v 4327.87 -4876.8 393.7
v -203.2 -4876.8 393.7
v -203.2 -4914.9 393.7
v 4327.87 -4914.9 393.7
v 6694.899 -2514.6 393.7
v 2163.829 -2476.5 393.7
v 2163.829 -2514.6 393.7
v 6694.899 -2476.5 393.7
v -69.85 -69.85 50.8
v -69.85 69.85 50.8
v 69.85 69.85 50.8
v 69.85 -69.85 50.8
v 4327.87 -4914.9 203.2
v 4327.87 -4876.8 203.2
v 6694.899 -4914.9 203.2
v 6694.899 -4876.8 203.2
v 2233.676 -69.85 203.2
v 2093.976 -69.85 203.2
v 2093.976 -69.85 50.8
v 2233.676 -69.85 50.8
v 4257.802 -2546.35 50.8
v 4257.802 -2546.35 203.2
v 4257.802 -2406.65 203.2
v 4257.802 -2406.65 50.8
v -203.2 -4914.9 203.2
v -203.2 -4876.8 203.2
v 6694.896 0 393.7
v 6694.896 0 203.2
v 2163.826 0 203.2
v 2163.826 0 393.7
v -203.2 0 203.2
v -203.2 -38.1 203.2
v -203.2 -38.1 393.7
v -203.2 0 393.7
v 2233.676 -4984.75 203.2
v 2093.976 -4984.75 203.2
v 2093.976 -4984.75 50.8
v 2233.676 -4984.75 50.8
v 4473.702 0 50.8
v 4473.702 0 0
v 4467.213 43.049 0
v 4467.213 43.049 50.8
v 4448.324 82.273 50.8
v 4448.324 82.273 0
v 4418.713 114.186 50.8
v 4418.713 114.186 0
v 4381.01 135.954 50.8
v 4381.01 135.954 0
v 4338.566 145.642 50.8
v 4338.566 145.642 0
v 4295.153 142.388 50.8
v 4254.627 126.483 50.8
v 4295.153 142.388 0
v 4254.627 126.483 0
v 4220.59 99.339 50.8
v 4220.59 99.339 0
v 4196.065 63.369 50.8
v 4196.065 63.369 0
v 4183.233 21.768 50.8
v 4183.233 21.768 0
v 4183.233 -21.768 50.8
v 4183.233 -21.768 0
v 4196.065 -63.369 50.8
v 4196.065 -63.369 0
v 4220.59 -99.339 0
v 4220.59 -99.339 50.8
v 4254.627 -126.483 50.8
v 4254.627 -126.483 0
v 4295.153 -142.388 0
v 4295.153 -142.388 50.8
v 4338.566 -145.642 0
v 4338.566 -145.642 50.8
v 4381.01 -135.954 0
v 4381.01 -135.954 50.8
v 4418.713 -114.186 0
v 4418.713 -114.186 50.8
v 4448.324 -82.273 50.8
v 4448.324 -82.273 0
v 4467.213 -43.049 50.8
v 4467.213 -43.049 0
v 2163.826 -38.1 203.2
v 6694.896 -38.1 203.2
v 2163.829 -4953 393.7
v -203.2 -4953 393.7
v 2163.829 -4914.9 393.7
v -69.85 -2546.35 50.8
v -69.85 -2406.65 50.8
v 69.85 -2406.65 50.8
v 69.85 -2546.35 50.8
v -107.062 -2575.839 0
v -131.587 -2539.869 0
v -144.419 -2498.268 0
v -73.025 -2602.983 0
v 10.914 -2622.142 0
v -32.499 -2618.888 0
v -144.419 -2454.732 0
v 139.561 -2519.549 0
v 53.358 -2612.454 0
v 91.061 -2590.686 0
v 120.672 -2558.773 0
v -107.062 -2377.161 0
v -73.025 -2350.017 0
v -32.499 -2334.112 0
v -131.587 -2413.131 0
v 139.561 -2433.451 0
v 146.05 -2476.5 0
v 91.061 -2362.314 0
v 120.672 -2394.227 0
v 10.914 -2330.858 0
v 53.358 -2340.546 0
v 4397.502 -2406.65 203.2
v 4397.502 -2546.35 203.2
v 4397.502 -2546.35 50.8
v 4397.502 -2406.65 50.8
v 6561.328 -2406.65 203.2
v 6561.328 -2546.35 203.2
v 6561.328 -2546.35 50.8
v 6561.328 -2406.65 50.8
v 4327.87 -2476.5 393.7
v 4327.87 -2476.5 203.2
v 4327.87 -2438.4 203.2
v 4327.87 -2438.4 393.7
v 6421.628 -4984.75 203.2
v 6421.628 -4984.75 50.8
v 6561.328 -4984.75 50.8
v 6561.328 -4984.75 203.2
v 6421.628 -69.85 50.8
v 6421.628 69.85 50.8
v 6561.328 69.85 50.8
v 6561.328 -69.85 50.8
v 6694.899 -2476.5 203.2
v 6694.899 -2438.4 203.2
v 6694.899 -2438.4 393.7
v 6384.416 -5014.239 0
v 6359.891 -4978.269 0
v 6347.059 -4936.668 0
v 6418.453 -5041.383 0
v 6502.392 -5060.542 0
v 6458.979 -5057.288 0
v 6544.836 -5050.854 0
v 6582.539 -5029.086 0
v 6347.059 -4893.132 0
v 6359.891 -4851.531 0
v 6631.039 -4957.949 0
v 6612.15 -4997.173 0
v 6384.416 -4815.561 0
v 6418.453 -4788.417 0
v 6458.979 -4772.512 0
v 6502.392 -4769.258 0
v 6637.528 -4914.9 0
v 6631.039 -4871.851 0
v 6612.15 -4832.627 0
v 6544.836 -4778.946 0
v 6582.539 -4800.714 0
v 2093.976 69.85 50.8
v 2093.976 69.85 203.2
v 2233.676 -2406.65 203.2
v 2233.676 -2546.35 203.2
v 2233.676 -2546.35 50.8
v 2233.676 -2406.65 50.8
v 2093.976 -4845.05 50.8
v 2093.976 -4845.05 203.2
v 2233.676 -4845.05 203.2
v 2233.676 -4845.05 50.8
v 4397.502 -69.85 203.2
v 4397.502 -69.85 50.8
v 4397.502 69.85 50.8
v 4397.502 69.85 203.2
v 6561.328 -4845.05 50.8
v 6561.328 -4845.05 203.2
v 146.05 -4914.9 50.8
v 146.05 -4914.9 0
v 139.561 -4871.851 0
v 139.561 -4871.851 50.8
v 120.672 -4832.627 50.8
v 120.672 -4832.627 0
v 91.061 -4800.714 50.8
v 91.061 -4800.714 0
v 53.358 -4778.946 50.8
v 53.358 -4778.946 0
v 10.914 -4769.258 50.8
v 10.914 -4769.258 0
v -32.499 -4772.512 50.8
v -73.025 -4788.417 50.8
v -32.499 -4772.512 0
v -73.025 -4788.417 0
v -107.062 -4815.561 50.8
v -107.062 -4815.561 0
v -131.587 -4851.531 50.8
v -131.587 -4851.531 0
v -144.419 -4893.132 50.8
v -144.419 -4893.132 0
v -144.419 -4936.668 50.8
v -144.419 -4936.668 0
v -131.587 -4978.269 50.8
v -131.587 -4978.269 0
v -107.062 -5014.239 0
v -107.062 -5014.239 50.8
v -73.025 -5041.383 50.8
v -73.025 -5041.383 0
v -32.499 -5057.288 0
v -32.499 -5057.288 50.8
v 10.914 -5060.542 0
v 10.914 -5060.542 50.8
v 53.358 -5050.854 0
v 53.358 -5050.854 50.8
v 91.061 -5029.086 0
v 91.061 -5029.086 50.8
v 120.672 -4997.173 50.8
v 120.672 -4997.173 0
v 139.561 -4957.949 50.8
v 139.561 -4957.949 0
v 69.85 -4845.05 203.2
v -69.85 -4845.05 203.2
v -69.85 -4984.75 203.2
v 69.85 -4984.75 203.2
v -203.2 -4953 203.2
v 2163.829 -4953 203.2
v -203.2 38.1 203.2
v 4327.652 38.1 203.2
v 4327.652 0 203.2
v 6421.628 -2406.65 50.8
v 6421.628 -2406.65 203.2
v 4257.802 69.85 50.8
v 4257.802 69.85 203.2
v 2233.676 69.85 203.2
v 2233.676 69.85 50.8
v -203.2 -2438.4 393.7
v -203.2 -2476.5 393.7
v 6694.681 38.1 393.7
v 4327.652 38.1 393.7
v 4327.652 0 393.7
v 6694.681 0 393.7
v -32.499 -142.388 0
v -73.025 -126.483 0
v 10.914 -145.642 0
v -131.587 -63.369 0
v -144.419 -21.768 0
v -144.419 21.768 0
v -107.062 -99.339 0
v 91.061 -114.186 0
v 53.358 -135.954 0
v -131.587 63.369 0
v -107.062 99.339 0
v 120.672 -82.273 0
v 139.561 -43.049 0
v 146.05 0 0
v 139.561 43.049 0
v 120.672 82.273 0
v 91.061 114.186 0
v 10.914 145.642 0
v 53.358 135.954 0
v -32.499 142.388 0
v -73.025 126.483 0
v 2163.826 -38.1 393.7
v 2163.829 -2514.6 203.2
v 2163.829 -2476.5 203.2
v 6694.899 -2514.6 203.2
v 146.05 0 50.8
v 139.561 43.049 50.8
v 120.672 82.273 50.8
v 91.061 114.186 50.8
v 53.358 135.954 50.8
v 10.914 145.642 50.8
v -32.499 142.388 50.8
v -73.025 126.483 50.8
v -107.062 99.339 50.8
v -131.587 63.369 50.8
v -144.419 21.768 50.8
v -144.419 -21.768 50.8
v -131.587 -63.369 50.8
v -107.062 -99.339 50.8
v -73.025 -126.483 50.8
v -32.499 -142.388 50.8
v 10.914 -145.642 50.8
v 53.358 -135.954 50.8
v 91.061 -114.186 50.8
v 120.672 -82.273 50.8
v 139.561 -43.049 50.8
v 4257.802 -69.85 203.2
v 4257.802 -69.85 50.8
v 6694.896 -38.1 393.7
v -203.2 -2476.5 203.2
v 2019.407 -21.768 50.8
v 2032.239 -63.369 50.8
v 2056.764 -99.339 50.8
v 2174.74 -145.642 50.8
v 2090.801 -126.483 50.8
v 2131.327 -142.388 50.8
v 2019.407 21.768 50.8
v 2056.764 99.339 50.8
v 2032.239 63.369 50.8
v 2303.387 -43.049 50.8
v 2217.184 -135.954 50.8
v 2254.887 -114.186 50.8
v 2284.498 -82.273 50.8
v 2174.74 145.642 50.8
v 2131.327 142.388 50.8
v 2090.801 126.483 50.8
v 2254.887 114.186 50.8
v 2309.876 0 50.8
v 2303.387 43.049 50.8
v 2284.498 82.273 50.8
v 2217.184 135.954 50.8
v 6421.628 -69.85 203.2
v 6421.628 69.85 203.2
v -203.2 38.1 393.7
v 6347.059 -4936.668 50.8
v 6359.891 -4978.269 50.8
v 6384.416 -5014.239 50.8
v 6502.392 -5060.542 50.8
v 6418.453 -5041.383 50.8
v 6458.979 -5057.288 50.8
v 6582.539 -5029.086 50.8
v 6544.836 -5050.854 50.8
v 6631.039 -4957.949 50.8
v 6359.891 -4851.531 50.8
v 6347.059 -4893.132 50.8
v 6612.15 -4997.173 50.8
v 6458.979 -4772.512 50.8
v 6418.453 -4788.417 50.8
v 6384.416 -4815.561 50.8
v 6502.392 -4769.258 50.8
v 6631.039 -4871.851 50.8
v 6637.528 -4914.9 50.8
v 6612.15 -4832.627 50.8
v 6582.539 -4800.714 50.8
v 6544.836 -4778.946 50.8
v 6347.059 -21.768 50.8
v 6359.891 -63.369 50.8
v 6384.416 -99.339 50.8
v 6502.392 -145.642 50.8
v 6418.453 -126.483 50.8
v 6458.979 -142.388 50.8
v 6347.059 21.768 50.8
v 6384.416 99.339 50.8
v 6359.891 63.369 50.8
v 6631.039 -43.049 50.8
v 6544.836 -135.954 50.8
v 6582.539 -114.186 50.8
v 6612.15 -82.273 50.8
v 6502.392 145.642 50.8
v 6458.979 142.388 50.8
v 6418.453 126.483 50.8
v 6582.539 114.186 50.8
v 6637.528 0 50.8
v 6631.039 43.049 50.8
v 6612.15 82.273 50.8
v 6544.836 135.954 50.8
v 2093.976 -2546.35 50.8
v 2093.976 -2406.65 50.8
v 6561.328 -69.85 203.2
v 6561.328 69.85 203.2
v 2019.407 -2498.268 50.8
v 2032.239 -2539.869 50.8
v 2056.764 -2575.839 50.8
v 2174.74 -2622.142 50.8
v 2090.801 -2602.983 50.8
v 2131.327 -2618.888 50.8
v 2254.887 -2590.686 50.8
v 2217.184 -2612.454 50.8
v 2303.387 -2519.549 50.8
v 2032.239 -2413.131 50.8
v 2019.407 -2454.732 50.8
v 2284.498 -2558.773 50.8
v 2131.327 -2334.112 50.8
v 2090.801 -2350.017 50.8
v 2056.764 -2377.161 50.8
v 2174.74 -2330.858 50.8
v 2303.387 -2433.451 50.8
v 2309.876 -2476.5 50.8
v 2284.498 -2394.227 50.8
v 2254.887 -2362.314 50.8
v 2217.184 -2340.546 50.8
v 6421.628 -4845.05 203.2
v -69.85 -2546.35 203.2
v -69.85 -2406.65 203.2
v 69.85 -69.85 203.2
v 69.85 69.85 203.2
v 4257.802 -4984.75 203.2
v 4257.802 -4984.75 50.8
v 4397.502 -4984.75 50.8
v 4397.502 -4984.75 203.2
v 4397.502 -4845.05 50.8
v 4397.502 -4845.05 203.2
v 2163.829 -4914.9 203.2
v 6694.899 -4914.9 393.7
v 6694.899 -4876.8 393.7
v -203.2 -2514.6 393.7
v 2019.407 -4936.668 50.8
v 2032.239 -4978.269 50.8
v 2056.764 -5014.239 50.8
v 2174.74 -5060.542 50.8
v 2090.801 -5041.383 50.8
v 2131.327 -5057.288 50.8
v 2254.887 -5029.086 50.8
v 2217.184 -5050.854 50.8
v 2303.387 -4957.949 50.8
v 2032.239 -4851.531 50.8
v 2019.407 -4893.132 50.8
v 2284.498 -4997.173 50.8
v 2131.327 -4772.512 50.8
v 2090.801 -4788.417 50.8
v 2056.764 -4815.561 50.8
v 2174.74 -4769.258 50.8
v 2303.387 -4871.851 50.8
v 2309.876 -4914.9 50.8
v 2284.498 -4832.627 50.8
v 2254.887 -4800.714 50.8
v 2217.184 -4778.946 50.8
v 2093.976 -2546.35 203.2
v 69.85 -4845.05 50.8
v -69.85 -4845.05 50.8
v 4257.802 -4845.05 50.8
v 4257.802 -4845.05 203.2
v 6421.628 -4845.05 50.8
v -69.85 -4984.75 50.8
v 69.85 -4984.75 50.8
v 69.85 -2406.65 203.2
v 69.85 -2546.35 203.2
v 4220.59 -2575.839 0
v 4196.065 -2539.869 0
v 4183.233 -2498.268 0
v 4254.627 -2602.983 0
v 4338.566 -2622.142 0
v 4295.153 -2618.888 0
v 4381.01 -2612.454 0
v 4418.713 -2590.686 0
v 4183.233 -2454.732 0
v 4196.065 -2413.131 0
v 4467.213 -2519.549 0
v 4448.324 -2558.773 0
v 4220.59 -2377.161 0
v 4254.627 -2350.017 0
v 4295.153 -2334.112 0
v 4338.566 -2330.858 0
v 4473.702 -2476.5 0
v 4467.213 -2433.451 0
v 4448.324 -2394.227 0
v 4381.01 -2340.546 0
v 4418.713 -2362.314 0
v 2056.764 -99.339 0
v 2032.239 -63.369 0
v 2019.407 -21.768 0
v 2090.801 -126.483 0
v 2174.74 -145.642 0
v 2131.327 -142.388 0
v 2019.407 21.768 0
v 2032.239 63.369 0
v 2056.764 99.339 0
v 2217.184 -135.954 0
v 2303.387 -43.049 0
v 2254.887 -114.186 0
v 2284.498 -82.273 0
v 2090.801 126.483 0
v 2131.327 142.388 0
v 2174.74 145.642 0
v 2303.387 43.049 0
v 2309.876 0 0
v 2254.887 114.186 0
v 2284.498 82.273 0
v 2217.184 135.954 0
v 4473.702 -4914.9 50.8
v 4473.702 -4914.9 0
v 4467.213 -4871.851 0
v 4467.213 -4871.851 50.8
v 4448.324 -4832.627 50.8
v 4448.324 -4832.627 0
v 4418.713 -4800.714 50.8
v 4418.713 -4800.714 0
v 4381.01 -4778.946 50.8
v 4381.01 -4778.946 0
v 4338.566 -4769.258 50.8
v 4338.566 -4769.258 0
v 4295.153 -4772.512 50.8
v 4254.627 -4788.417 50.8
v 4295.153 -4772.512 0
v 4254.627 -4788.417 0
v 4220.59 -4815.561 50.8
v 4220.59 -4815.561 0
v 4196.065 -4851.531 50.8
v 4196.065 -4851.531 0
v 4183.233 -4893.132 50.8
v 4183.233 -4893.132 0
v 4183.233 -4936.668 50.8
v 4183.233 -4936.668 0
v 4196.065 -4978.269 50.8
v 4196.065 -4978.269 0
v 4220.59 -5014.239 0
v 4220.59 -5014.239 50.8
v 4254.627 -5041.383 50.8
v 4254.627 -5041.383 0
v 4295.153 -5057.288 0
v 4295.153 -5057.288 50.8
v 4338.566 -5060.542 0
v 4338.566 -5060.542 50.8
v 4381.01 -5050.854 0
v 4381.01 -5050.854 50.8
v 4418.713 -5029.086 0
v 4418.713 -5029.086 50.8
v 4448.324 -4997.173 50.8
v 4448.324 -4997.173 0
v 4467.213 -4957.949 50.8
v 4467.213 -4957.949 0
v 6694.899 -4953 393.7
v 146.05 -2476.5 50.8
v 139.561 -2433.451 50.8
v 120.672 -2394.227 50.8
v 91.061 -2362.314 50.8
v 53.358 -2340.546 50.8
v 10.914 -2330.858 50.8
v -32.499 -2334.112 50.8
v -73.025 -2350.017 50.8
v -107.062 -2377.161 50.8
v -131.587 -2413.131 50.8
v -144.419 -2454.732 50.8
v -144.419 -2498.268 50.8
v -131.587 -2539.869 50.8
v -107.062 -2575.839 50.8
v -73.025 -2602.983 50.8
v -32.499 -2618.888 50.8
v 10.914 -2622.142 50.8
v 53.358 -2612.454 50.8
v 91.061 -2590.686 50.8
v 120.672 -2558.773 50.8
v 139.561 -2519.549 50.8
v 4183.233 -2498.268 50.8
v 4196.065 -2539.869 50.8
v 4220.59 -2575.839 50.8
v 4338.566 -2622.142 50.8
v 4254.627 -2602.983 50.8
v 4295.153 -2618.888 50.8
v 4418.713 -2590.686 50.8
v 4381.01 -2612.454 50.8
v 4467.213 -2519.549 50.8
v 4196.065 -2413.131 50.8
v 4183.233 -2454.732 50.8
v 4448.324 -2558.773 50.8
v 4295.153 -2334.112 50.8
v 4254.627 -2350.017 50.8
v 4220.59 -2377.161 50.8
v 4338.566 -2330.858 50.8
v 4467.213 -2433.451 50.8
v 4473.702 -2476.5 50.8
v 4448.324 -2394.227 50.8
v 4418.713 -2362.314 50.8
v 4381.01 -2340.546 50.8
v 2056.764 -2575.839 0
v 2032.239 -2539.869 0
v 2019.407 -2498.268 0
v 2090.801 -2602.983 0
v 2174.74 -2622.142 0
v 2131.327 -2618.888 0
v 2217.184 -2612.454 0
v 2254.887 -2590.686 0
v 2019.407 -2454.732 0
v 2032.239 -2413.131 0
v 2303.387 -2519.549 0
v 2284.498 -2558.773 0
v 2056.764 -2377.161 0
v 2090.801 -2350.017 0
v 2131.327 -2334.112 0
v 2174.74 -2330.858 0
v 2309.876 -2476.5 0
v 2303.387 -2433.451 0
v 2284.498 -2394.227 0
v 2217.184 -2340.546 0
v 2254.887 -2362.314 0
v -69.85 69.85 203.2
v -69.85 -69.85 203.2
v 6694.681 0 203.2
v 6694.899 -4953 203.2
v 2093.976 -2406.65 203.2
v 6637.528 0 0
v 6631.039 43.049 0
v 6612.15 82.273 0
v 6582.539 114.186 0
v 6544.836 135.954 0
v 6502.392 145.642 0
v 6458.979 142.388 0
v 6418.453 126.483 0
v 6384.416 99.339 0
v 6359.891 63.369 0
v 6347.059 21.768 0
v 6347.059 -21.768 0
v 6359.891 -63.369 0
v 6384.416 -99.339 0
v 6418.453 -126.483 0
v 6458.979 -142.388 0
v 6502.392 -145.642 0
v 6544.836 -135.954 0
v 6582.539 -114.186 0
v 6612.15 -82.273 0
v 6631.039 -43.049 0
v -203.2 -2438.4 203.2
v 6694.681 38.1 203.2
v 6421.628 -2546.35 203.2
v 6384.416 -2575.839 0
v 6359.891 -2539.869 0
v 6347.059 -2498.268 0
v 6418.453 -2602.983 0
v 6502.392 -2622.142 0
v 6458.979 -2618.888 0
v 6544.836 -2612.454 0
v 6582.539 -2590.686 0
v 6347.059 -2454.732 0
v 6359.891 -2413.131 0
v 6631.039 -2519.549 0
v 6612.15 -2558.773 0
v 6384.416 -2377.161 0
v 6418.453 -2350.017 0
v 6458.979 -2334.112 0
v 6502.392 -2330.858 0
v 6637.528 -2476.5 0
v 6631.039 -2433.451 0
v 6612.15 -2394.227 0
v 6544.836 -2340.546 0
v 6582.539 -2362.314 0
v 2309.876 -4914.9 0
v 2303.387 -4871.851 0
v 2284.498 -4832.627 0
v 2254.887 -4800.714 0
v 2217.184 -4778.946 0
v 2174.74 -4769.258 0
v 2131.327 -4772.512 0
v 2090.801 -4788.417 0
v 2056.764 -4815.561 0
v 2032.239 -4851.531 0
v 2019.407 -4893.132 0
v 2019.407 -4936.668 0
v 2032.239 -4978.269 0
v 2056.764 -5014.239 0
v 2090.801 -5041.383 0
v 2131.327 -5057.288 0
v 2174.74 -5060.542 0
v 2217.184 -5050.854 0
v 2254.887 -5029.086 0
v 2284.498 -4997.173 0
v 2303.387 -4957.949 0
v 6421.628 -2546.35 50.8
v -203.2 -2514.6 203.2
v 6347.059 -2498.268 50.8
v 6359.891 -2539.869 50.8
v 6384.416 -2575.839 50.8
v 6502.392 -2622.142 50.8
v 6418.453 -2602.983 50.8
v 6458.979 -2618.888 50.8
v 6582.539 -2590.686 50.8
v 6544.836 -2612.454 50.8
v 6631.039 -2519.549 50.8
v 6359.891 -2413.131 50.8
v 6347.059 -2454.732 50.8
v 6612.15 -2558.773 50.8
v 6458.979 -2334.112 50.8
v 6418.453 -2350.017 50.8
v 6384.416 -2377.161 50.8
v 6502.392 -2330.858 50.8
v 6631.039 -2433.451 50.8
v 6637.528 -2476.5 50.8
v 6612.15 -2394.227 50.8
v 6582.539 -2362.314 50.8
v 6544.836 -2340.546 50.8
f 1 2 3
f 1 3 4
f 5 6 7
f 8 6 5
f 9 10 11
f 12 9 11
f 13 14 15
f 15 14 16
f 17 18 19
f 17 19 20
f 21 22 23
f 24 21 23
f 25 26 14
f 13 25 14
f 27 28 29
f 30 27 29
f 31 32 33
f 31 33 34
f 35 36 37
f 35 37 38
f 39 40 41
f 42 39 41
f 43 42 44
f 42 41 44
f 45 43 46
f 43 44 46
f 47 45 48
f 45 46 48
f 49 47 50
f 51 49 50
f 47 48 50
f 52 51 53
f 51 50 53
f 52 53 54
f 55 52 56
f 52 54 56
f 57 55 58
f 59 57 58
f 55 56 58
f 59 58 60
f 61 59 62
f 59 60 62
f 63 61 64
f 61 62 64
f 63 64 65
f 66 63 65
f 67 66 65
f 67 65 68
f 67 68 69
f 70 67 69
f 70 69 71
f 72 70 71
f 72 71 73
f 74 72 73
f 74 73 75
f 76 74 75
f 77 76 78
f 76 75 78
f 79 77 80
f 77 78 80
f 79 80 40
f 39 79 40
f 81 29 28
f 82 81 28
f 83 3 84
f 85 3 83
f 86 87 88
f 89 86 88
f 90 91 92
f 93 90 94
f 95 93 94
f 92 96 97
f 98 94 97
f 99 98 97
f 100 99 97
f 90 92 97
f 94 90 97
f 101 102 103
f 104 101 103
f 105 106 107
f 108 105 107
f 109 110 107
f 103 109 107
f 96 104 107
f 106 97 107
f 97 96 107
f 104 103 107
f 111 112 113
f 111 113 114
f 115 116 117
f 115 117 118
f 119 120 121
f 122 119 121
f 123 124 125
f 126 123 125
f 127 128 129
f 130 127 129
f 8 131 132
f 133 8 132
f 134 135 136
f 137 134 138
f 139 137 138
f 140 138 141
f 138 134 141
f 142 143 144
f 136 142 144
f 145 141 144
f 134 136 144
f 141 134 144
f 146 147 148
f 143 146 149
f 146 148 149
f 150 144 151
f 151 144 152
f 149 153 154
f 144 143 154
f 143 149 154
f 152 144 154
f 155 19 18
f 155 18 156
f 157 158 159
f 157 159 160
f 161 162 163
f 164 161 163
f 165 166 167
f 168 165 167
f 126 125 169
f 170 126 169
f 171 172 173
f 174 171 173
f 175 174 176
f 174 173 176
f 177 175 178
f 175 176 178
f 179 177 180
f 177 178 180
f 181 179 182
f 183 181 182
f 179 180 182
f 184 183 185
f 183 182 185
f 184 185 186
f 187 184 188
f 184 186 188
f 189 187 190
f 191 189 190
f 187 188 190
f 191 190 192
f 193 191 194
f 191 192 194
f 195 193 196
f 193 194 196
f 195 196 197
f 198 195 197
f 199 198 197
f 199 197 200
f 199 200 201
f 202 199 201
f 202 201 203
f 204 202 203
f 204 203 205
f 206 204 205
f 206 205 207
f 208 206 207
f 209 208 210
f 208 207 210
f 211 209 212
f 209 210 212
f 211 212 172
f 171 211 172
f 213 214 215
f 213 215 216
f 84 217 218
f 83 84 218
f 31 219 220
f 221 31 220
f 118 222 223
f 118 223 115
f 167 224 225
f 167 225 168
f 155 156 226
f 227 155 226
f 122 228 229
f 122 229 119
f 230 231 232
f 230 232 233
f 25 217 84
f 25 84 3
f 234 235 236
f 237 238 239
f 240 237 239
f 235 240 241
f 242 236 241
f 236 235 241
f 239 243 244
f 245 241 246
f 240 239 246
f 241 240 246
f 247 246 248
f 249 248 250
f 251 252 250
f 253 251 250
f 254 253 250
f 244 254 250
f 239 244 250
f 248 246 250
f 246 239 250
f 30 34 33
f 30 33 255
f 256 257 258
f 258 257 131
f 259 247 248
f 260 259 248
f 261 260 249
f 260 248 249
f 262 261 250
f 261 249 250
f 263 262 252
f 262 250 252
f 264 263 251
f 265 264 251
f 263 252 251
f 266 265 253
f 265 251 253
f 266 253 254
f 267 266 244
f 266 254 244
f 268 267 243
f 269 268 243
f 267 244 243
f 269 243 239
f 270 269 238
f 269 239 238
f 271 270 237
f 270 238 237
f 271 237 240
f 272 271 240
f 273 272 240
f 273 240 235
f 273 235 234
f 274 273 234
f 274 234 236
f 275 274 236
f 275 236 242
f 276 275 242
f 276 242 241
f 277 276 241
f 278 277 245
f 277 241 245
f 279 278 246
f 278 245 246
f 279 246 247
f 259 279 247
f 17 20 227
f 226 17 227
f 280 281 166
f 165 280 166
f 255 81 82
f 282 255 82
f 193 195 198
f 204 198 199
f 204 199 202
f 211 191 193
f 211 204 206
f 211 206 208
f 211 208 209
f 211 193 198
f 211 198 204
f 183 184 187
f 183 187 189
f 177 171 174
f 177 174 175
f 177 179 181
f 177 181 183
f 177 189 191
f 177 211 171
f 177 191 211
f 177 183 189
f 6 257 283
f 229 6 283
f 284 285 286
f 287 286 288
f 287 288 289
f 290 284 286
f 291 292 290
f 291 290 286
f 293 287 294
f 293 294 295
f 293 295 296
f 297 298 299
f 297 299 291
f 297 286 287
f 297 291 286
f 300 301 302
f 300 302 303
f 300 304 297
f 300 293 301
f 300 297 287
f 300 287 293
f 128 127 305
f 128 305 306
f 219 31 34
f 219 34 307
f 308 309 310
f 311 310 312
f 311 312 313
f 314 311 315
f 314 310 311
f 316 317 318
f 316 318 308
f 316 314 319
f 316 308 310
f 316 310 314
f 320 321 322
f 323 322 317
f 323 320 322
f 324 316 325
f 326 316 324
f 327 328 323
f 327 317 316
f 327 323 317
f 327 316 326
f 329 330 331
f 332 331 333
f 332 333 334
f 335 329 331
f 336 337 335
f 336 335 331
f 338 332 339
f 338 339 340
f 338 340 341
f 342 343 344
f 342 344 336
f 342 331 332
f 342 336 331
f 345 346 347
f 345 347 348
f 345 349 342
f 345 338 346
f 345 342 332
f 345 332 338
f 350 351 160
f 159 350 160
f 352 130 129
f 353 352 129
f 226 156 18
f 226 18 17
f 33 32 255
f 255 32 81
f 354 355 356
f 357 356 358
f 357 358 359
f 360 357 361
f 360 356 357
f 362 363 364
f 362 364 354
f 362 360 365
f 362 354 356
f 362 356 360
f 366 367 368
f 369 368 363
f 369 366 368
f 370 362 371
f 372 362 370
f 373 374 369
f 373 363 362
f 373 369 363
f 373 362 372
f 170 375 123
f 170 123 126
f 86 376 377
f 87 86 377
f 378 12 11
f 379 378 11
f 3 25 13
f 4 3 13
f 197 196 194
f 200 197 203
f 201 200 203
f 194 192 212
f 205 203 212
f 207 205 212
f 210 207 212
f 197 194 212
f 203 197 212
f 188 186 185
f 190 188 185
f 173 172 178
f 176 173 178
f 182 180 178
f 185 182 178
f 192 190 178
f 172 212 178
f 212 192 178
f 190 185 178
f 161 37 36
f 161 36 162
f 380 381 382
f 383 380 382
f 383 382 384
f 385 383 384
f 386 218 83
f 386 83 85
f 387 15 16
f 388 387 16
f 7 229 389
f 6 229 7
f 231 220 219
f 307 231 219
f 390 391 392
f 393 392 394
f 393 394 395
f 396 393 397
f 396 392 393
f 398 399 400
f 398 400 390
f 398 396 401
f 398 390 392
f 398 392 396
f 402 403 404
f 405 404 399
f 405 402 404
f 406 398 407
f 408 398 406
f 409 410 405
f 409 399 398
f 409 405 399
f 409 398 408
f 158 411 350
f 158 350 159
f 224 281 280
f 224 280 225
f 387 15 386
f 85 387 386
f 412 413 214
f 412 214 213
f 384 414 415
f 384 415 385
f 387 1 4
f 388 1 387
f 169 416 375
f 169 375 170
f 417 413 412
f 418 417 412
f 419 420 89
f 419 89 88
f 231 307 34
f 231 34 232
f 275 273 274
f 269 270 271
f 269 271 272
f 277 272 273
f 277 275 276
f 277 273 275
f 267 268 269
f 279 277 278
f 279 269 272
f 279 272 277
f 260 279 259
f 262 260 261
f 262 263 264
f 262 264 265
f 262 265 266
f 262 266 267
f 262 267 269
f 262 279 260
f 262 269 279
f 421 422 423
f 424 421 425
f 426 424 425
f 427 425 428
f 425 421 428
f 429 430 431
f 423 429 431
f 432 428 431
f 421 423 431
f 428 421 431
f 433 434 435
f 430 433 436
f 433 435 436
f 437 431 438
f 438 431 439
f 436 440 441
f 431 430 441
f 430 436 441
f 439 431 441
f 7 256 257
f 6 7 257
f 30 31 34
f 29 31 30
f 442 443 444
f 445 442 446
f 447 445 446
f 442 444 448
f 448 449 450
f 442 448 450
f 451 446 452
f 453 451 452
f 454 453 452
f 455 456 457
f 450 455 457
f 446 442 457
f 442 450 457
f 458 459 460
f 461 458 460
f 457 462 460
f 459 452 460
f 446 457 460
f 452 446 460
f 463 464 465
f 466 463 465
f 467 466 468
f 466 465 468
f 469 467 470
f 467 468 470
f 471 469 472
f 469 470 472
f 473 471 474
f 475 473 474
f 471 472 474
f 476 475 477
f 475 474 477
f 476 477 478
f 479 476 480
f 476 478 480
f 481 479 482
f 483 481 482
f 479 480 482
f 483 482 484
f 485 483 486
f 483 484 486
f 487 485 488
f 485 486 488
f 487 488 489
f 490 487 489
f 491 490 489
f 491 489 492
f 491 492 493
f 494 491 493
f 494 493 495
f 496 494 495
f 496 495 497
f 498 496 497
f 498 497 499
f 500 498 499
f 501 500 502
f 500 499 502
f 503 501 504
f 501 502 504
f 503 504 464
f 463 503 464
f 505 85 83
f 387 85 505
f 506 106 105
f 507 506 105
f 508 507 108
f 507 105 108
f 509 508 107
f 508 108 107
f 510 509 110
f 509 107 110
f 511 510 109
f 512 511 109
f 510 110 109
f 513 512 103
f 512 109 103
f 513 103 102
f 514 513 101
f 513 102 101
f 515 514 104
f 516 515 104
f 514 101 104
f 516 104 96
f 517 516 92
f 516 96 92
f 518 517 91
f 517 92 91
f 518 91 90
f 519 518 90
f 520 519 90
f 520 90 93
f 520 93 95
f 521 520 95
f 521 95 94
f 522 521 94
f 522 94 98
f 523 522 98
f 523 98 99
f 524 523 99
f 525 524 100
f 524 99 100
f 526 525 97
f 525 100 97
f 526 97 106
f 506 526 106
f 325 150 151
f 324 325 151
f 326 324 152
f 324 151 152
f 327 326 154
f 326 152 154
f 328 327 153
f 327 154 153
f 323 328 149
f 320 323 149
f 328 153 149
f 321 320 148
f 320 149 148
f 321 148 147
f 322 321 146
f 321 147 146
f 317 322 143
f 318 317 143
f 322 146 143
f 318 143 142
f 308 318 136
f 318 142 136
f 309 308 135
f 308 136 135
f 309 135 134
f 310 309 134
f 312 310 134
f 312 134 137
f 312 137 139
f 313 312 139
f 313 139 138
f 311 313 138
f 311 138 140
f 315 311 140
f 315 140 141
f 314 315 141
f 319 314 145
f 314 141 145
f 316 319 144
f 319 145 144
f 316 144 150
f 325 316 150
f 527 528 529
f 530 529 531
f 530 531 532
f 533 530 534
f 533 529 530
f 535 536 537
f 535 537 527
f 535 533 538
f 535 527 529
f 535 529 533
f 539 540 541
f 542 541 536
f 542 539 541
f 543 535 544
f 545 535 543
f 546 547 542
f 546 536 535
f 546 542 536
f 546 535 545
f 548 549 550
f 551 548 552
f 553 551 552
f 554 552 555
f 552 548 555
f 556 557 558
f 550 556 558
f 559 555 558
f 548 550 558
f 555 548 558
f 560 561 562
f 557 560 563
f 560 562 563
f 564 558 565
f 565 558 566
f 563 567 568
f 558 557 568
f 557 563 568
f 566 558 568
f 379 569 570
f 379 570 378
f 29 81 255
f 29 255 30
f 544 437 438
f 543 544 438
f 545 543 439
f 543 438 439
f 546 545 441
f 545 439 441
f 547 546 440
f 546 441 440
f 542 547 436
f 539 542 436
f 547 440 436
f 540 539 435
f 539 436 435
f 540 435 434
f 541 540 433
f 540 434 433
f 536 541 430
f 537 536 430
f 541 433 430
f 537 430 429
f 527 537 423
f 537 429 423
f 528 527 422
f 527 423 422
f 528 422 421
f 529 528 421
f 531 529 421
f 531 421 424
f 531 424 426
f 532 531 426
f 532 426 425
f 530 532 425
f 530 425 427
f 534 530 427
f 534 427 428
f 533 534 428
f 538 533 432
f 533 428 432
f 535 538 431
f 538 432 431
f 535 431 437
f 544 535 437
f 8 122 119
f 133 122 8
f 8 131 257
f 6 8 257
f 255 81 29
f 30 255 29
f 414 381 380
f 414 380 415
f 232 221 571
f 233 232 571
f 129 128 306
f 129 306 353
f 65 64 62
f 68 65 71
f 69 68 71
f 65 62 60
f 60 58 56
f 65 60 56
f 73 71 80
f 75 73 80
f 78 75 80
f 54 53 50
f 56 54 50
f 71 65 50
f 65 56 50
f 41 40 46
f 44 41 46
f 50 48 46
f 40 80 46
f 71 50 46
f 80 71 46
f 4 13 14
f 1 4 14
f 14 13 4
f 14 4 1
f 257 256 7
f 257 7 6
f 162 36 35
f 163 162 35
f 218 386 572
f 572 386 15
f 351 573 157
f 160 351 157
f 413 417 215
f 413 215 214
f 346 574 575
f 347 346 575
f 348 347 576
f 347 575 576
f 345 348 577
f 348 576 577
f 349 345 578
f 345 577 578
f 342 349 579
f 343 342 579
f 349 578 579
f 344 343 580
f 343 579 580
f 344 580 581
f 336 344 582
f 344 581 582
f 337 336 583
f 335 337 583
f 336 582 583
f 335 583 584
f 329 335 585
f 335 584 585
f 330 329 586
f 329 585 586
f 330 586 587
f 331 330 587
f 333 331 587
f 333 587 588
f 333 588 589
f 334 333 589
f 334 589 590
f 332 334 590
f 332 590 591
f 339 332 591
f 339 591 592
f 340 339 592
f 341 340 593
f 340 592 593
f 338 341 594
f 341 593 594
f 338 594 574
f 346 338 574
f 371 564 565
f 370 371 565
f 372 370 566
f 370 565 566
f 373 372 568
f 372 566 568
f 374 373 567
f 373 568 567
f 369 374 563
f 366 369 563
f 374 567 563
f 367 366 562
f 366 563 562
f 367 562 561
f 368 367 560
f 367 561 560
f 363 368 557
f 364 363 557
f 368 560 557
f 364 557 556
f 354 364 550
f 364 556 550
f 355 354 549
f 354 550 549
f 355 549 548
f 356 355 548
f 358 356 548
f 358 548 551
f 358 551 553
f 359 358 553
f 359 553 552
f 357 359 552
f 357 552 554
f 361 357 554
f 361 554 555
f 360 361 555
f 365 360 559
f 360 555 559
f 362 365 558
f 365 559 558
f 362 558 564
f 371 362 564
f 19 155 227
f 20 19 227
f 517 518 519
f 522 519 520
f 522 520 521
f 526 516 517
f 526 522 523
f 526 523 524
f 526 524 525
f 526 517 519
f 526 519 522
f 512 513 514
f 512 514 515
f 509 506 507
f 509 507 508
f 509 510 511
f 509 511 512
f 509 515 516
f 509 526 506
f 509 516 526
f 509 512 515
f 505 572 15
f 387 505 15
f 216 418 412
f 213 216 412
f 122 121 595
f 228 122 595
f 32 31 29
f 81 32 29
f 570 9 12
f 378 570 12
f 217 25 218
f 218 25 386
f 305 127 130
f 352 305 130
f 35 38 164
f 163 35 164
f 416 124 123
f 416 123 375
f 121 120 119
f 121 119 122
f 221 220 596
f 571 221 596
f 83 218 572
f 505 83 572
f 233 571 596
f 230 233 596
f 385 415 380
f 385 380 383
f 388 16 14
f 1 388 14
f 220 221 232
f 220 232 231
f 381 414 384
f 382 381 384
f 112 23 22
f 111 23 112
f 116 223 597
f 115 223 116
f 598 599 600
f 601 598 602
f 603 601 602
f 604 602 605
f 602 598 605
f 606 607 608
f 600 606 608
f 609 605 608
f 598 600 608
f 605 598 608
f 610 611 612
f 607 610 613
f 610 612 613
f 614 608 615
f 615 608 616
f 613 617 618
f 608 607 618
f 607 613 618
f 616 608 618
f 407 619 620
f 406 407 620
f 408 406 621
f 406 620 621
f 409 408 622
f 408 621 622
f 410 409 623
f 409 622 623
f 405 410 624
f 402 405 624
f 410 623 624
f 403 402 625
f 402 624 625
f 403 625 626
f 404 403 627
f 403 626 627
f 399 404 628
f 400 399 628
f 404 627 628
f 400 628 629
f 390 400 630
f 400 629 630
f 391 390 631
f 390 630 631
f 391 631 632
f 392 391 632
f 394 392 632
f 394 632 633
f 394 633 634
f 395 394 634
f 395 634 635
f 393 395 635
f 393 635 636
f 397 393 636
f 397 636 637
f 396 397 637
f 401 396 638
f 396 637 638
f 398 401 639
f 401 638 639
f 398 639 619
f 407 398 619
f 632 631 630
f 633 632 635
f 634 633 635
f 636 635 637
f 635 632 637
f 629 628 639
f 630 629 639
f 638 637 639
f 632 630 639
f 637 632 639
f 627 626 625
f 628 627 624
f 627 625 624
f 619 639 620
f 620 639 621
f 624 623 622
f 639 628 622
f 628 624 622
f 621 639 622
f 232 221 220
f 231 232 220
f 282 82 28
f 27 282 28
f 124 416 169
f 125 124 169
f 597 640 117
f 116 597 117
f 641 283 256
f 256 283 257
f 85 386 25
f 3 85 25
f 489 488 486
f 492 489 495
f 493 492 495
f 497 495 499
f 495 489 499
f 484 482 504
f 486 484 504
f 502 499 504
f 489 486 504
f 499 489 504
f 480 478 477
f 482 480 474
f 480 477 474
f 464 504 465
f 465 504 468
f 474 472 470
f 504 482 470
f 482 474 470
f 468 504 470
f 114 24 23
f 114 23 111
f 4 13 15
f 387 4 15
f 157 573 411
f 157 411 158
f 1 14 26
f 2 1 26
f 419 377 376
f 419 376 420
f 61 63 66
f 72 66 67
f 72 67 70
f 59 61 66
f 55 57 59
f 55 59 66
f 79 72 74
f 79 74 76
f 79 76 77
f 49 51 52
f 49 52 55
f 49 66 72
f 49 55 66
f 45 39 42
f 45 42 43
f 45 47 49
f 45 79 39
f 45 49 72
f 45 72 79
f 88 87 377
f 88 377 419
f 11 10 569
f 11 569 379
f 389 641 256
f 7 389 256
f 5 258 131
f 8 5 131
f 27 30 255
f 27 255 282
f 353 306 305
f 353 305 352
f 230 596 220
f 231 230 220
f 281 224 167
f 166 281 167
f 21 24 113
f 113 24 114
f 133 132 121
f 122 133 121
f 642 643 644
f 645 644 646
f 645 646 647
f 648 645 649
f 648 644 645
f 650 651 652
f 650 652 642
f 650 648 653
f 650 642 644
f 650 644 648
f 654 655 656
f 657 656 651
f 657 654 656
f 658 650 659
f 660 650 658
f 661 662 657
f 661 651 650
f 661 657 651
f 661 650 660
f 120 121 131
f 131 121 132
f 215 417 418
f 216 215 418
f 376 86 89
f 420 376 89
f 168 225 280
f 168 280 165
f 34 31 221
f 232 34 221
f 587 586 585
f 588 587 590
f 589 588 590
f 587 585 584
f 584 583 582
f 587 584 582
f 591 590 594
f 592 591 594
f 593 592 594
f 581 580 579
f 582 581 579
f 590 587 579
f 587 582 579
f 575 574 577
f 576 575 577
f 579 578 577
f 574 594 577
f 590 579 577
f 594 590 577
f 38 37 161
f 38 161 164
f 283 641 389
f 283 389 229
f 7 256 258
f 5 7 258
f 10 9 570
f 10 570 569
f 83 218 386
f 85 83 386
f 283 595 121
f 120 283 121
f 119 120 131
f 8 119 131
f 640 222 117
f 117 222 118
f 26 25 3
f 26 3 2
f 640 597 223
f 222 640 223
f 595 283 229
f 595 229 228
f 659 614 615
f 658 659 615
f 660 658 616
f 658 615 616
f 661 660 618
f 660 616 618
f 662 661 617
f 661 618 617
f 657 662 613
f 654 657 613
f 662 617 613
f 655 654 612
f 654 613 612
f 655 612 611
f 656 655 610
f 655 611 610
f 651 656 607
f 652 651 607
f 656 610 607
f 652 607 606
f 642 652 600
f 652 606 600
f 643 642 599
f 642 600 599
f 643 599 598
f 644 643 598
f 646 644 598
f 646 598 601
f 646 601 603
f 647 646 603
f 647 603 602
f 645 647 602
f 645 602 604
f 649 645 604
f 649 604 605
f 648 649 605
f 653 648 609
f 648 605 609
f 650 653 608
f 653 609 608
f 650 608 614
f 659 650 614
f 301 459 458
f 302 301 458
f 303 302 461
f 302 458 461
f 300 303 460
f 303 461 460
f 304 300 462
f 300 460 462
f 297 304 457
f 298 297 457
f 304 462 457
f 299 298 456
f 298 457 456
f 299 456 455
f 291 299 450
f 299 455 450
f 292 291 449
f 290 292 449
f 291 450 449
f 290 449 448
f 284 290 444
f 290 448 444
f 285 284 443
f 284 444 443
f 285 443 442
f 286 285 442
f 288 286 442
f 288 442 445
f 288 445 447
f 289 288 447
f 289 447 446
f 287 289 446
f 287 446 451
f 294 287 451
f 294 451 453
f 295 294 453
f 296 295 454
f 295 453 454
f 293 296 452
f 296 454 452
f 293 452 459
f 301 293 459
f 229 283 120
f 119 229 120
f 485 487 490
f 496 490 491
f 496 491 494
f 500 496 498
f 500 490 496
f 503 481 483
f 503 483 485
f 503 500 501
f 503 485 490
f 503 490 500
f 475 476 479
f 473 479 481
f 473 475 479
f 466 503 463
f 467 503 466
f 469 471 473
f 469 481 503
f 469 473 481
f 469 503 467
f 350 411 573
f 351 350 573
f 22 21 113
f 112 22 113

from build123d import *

# Parameters (mm, degrees)
F0_R      = 146.05
F1_DEPTH  = 50.8
F2_W      = 139.7
F2_H      = 139.7
F3_DEPTH  = 152.4
F4_W      = 2367.026
F4_H      = 38.1
F5_DEPTH  = 190.5
F6_W      = 4257.802
F6_H      = 38.1
F6_W_2    = 139.7
F6_W_3    = 133.35
F7_DEPTH  = 190.5
F8_W      = 139.7
F8_H      = 38.1
F8_W_2    = 133.35
F8_W_3    = 4258.02044
F9_DEPTH  = 190.5
F10_W     = 69.85
F10_H     = 38.1
F10_W_2   = 2297.17854
F11_DEPTH = 190.5
F12_W     = 69.85
F12_H     = 38.1
F12_W_2   = 4461.22044
F13_DEPTH = 190.5
F14_W     = 133.35
F14_H     = 38.1
F14_W_2   = 139.7
F14_W_3   = 4258.02044
F15_DEPTH = 190.5
F16_W     = 133.35
F16_H     = 38.1
F16_W_2   = 139.7
F16_W_3   = 2093.97854
F17_DEPTH = 190.5
F18_W     = 133.35
F18_H     = 38.1
F18_W_2   = 139.7
F18_W_3   = 2093.97854
F19_DEPTH = 190.5
F20_W     = 69.84746
F20_H     = 38.1
F20_W_2   = 4461.22298
F21_DEPTH = 190.5
F22_W     = 4461.22298
F22_H     = 38.1
F22_W_2   = 69.84746
F23_DEPTH = 190.5
F24_W     = 2297.39698
F24_H     = 38.1
F24_W_2   = 69.63156
F25_DEPTH = 190.5
F26_W     = 2297.39698
F26_H     = 38.1
F26_W_2   = 69.63156
F27_DEPTH = 190.5


with BuildPart() as f1:
    # F0 (on Top) → F1 (new body)
    with BuildSketch(Plane.XY):
        with Locations((6491.478, 0)):
            Circle(F0_R)
    extrude(amount=F1_DEPTH)


with BuildPart() as f1b:
    # F0 (on Top) → F1, piece 2 (new body)
    with BuildSketch(Plane.XY):
        with Locations((6491.478, -4914.9)):
            Circle(F0_R)
    extrude(amount=F1_DEPTH)


with BuildPart() as f1c:
    # F0 (on Top) → F1, piece 3 (new body)
    with BuildSketch(Plane.XY):
        with Locations((2163.826, -2476.5)):
            Circle(F0_R)
    extrude(amount=F1_DEPTH)


with BuildPart() as f1d:
    # F0 (on Top) → F1, piece 4 (new body)
    with BuildSketch(Plane.XY):
        with Locations((2163.826, -4914.9)):
            Circle(F0_R)
    extrude(amount=F1_DEPTH)


with BuildPart() as f1e:
    # F0 (on Top) → F1, piece 5 (new body)
    with BuildSketch(Plane.XY):
        with Locations((0, -2476.5)):
            Circle(F0_R)
    extrude(amount=F1_DEPTH)


with BuildPart() as f1f:
    # F0 (on Top) → F1, piece 6 (new body)
    with BuildSketch(Plane.XY):
        with Locations((2163.826, 0)):
            Circle(F0_R)
    extrude(amount=F1_DEPTH)


with BuildPart() as f1g:
    # F0 (on Top) → F1, piece 7 (new body)
    with BuildSketch(Plane.XY):
        with Locations((4327.652, -4914.9)):
            Circle(F0_R)
    extrude(amount=F1_DEPTH)


with BuildPart() as f1h:
    # F0 (on Top) → F1, piece 8 (new body)
    with BuildSketch(Plane.XY):
        Circle(F0_R)
    extrude(amount=F1_DEPTH)


with BuildPart() as f1i:
    # F0 (on Top) → F1, piece 9 (new body)
    with BuildSketch(Plane.XY):
        with Locations((4327.652, 0)):
            Circle(F0_R)
    extrude(amount=F1_DEPTH)


with BuildPart() as f1j:
    # F0 (on Top) → F1, piece 10 (new body)
    with BuildSketch(Plane.XY):
        with Locations((4327.652, -2476.5)):
            Circle(F0_R)
    extrude(amount=F1_DEPTH)


with BuildPart() as f1k:
    # F0 (on Top) → F1, piece 11 (new body)
    with BuildSketch(Plane.XY):
        with Locations((6491.478, -2476.5)):
            Circle(F0_R)
    extrude(amount=F1_DEPTH)


with BuildPart() as f1l:
    # F0 (on Top) → F1, piece 12 (new body)
    with BuildSketch(Plane.XY):
        with Locations((0, -4914.9)):
            Circle(F0_R)
    extrude(amount=F1_DEPTH)


with BuildPart() as f3:
    # F2 (on face) → F3 (new body)
    with BuildSketch(Plane.XY.offset(50.8)):
        Rectangle(F2_W, F2_H)
    extrude(amount=F3_DEPTH)


with BuildPart() as f3b:
    # F2 (on face) → F3, piece 2 (new body)
    with BuildSketch(Plane.XY.offset(50.8)):
        with Locations((2163.826, 0)):
            Rectangle(F2_W, F2_H)
    extrude(amount=F3_DEPTH)


with BuildPart() as f3c:
    # F2 (on face) → F3, piece 3 (new body)
    with BuildSketch(Plane.XY.offset(50.8)):
        with Locations((4327.652, 0)):
            Rectangle(F2_W, F2_H)
    extrude(amount=F3_DEPTH)


with BuildPart() as f3d:
    # F2 (on face) → F3, piece 4 (new body)
    with BuildSketch(Plane.XY.offset(50.8)):
        with Locations((6491.478, 0)):
            Rectangle(F2_W, F2_H)
    extrude(amount=F3_DEPTH)


with BuildPart() as f3e:
    # F2 (on face) → F3, piece 5 (new body)
    with BuildSketch(Plane.XY.offset(50.8)):
        with Locations((0, -2476.5)):
            Rectangle(F2_W, F2_H)
    extrude(amount=F3_DEPTH)


with BuildPart() as f3f:
    # F2 (on face) → F3, piece 6 (new body)
    with BuildSketch(Plane.XY.offset(50.8)):
        with Locations((2163.826, -2476.5)):
            Rectangle(F2_W, F2_H)
    extrude(amount=F3_DEPTH)


with BuildPart() as f3g:
    # F2 (on face) → F3, piece 7 (new body)
    with BuildSketch(Plane.XY.offset(50.8)):
        with Locations((4327.652, -2476.5)):
            Rectangle(F2_W, F2_H)
    extrude(amount=F3_DEPTH)


with BuildPart() as f3h:
    # F2 (on face) → F3, piece 8 (new body)
    with BuildSketch(Plane.XY.offset(50.8)):
        with Locations((6491.478, -2476.5)):
            Rectangle(F2_W, F2_H)
    extrude(amount=F3_DEPTH)


with BuildPart() as f3i:
    # F2 (on face) → F3, piece 9 (new body)
    with BuildSketch(Plane.XY.offset(50.8)):
        with Locations((0, -4914.9)):
            Rectangle(F2_W, F2_H)
    extrude(amount=F3_DEPTH)


with BuildPart() as f3j:
    # F2 (on face) → F3, piece 10 (new body)
    with BuildSketch(Plane.XY.offset(50.8)):
        with Locations((2163.826, -4914.9)):
            Rectangle(F2_W, F2_H)
    extrude(amount=F3_DEPTH)


with BuildPart() as f3k:
    # F2 (on face) → F3, piece 11 (new body)
    with BuildSketch(Plane.XY.offset(50.8)):
        with Locations((4327.652, -4914.9)):
            Rectangle(F2_W, F2_H)
    extrude(amount=F3_DEPTH)


with BuildPart() as f3l:
    # F2 (on face) → F3, piece 12 (new body)
    with BuildSketch(Plane.XY.offset(50.8)):
        with Locations((6491.478, -4914.9)):
            Rectangle(F2_W, F2_H)
    extrude(amount=F3_DEPTH)


with BuildPart() as f5:
    # F4 (on face) → F5 (new body)
    with BuildSketch(Plane.XY.offset(203.2)):
        with Locations((980.313, -19.05)):
            Rectangle(F4_W, F4_H)
    extrude(amount=F5_DEPTH)


with BuildPart() as f7:
    # F6 (on face) → F7 (new body)
    with BuildSketch(Plane.XY.offset(203.2)):
        with Locations((2198.751, 19.05)):
            Rectangle(F6_W, F6_H)
        with Locations((0, 19.05)):
            Rectangle(F6_W_2, F6_H)
        with Locations((-136.525, 19.05)):
            Rectangle(F6_W_3, F6_H)
    extrude(amount=F7_DEPTH)


with BuildPart() as f9:
    # F8 (on face) → F9 (new body)
    with BuildSketch(Plane.XY.offset(203.2)):
        with Locations((0, -2457.45)):
            Rectangle(F8_W, F8_H)
        with Locations((-136.525, -2457.45)):
            Rectangle(F8_W_2, F8_H)
        with Locations((2198.86022, -2457.45)):
            Rectangle(F8_W_3, F8_H)
    extrude(amount=F9_DEPTH)


with BuildPart() as f11:
    # F10 (on face) → F11 (new body)
    with BuildSketch(Plane.XY.offset(203.2)):
        with Locations((4362.577, 19.05)):
            Rectangle(F10_W, F10_H)
        with Locations((5546.09127, 19.05)):
            Rectangle(F10_W_2, F10_H)
    extrude(amount=F11_DEPTH)


with BuildPart() as f13:
    # F12 (on face) → F13 (new body)
    with BuildSketch(Plane.XY.offset(203.2)):
        with Locations((2198.751, -19.05)):
            Rectangle(F12_W, F12_H)
        with Locations((4464.28622, -19.05)):
            Rectangle(F12_W_2, F12_H)
    extrude(amount=F13_DEPTH)


with BuildPart() as f15:
    # F14 (on face) → F15 (new body)
    with BuildSketch(Plane.XY.offset(203.2)):
        with Locations((-136.525, -4895.85)):
            Rectangle(F14_W, F14_H)
        with Locations((0, -4895.85)):
            Rectangle(F14_W_2, F14_H)
        with Locations((2198.86022, -4895.85)):
            Rectangle(F14_W_3, F14_H)
    extrude(amount=F15_DEPTH)


with BuildPart() as f17:
    # F16 (on face) → F17 (new body)
    with BuildSketch(Plane.XY.offset(203.2)):
        with Locations((-136.525, -2495.55)):
            Rectangle(F16_W, F16_H)
        with Locations((0, -2495.55)):
            Rectangle(F16_W_2, F16_H)
        with Locations((1116.83927, -2495.55)):
            Rectangle(F16_W_3, F16_H)
    extrude(amount=F17_DEPTH)


with BuildPart() as f19:
    # F18 (on face) → F19 (new body)
    with BuildSketch(Plane.XY.offset(203.2)):
        with Locations((-136.525, -4933.95)):
            Rectangle(F18_W, F18_H)
        with Locations((0, -4933.95)):
            Rectangle(F18_W_2, F18_H)
        with Locations((1116.83927, -4933.95)):
            Rectangle(F18_W_3, F18_H)
    extrude(amount=F19_DEPTH)


with BuildPart() as f21:
    # F20 (on face) → F21 (new body)
    with BuildSketch(Plane.XY.offset(203.2)):
        with Locations((2198.75227, -2495.55)):
            Rectangle(F20_W, F20_H)
        with Locations((4464.28749, -2495.55)):
            Rectangle(F20_W_2, F20_H)
    extrude(amount=F21_DEPTH)


with BuildPart() as f23:
    # F22 (on face) → F23 (new body)
    with BuildSketch(Plane.XY.offset(203.2)):
        with Locations((4464.28749, -4933.95)):
            Rectangle(F22_W, F22_H)
        with Locations((2198.75227, -4933.95)):
            Rectangle(F22_W_2, F22_H)
    extrude(amount=F23_DEPTH)


with BuildPart() as f25:
    # F24 (on face) → F25 (new body)
    with BuildSketch(Plane.XY.offset(203.2)):
        with Locations((5546.20049, -2457.45)):
            Rectangle(F24_W, F24_H)
        with Locations((4362.68622, -2457.45)):
            Rectangle(F24_W_2, F24_H)
    extrude(amount=F25_DEPTH)


with BuildPart() as f27:
    # F26 (on face) → F27 (new body)
    with BuildSketch(Plane.XY.offset(203.2)):
        with Locations((5546.20049, -4895.85)):
            Rectangle(F26_W, F26_H)
        with Locations((4362.68622, -4895.85)):
            Rectangle(F26_W_2, F26_H)
    extrude(amount=F27_DEPTH)


solid = Compound([f1.part, f1b.part, f1c.part, f1d.part, f1e.part, f1f.part, f1g.part, f1h.part, f1i.part, f1j.part, f1k.part, f1l.part, f3.part, f3b.part, f3c.part, f3d.part, f3e.part, f3f.part, f3g.part, f3h.part, f3i.part, f3j.part, f3k.part, f3l.part, f5.part, f7.part, f9.part, f11.part, f13.part, f15.part, f17.part, f19.part, f21.part, f23.part, f25.part, f27.part])
